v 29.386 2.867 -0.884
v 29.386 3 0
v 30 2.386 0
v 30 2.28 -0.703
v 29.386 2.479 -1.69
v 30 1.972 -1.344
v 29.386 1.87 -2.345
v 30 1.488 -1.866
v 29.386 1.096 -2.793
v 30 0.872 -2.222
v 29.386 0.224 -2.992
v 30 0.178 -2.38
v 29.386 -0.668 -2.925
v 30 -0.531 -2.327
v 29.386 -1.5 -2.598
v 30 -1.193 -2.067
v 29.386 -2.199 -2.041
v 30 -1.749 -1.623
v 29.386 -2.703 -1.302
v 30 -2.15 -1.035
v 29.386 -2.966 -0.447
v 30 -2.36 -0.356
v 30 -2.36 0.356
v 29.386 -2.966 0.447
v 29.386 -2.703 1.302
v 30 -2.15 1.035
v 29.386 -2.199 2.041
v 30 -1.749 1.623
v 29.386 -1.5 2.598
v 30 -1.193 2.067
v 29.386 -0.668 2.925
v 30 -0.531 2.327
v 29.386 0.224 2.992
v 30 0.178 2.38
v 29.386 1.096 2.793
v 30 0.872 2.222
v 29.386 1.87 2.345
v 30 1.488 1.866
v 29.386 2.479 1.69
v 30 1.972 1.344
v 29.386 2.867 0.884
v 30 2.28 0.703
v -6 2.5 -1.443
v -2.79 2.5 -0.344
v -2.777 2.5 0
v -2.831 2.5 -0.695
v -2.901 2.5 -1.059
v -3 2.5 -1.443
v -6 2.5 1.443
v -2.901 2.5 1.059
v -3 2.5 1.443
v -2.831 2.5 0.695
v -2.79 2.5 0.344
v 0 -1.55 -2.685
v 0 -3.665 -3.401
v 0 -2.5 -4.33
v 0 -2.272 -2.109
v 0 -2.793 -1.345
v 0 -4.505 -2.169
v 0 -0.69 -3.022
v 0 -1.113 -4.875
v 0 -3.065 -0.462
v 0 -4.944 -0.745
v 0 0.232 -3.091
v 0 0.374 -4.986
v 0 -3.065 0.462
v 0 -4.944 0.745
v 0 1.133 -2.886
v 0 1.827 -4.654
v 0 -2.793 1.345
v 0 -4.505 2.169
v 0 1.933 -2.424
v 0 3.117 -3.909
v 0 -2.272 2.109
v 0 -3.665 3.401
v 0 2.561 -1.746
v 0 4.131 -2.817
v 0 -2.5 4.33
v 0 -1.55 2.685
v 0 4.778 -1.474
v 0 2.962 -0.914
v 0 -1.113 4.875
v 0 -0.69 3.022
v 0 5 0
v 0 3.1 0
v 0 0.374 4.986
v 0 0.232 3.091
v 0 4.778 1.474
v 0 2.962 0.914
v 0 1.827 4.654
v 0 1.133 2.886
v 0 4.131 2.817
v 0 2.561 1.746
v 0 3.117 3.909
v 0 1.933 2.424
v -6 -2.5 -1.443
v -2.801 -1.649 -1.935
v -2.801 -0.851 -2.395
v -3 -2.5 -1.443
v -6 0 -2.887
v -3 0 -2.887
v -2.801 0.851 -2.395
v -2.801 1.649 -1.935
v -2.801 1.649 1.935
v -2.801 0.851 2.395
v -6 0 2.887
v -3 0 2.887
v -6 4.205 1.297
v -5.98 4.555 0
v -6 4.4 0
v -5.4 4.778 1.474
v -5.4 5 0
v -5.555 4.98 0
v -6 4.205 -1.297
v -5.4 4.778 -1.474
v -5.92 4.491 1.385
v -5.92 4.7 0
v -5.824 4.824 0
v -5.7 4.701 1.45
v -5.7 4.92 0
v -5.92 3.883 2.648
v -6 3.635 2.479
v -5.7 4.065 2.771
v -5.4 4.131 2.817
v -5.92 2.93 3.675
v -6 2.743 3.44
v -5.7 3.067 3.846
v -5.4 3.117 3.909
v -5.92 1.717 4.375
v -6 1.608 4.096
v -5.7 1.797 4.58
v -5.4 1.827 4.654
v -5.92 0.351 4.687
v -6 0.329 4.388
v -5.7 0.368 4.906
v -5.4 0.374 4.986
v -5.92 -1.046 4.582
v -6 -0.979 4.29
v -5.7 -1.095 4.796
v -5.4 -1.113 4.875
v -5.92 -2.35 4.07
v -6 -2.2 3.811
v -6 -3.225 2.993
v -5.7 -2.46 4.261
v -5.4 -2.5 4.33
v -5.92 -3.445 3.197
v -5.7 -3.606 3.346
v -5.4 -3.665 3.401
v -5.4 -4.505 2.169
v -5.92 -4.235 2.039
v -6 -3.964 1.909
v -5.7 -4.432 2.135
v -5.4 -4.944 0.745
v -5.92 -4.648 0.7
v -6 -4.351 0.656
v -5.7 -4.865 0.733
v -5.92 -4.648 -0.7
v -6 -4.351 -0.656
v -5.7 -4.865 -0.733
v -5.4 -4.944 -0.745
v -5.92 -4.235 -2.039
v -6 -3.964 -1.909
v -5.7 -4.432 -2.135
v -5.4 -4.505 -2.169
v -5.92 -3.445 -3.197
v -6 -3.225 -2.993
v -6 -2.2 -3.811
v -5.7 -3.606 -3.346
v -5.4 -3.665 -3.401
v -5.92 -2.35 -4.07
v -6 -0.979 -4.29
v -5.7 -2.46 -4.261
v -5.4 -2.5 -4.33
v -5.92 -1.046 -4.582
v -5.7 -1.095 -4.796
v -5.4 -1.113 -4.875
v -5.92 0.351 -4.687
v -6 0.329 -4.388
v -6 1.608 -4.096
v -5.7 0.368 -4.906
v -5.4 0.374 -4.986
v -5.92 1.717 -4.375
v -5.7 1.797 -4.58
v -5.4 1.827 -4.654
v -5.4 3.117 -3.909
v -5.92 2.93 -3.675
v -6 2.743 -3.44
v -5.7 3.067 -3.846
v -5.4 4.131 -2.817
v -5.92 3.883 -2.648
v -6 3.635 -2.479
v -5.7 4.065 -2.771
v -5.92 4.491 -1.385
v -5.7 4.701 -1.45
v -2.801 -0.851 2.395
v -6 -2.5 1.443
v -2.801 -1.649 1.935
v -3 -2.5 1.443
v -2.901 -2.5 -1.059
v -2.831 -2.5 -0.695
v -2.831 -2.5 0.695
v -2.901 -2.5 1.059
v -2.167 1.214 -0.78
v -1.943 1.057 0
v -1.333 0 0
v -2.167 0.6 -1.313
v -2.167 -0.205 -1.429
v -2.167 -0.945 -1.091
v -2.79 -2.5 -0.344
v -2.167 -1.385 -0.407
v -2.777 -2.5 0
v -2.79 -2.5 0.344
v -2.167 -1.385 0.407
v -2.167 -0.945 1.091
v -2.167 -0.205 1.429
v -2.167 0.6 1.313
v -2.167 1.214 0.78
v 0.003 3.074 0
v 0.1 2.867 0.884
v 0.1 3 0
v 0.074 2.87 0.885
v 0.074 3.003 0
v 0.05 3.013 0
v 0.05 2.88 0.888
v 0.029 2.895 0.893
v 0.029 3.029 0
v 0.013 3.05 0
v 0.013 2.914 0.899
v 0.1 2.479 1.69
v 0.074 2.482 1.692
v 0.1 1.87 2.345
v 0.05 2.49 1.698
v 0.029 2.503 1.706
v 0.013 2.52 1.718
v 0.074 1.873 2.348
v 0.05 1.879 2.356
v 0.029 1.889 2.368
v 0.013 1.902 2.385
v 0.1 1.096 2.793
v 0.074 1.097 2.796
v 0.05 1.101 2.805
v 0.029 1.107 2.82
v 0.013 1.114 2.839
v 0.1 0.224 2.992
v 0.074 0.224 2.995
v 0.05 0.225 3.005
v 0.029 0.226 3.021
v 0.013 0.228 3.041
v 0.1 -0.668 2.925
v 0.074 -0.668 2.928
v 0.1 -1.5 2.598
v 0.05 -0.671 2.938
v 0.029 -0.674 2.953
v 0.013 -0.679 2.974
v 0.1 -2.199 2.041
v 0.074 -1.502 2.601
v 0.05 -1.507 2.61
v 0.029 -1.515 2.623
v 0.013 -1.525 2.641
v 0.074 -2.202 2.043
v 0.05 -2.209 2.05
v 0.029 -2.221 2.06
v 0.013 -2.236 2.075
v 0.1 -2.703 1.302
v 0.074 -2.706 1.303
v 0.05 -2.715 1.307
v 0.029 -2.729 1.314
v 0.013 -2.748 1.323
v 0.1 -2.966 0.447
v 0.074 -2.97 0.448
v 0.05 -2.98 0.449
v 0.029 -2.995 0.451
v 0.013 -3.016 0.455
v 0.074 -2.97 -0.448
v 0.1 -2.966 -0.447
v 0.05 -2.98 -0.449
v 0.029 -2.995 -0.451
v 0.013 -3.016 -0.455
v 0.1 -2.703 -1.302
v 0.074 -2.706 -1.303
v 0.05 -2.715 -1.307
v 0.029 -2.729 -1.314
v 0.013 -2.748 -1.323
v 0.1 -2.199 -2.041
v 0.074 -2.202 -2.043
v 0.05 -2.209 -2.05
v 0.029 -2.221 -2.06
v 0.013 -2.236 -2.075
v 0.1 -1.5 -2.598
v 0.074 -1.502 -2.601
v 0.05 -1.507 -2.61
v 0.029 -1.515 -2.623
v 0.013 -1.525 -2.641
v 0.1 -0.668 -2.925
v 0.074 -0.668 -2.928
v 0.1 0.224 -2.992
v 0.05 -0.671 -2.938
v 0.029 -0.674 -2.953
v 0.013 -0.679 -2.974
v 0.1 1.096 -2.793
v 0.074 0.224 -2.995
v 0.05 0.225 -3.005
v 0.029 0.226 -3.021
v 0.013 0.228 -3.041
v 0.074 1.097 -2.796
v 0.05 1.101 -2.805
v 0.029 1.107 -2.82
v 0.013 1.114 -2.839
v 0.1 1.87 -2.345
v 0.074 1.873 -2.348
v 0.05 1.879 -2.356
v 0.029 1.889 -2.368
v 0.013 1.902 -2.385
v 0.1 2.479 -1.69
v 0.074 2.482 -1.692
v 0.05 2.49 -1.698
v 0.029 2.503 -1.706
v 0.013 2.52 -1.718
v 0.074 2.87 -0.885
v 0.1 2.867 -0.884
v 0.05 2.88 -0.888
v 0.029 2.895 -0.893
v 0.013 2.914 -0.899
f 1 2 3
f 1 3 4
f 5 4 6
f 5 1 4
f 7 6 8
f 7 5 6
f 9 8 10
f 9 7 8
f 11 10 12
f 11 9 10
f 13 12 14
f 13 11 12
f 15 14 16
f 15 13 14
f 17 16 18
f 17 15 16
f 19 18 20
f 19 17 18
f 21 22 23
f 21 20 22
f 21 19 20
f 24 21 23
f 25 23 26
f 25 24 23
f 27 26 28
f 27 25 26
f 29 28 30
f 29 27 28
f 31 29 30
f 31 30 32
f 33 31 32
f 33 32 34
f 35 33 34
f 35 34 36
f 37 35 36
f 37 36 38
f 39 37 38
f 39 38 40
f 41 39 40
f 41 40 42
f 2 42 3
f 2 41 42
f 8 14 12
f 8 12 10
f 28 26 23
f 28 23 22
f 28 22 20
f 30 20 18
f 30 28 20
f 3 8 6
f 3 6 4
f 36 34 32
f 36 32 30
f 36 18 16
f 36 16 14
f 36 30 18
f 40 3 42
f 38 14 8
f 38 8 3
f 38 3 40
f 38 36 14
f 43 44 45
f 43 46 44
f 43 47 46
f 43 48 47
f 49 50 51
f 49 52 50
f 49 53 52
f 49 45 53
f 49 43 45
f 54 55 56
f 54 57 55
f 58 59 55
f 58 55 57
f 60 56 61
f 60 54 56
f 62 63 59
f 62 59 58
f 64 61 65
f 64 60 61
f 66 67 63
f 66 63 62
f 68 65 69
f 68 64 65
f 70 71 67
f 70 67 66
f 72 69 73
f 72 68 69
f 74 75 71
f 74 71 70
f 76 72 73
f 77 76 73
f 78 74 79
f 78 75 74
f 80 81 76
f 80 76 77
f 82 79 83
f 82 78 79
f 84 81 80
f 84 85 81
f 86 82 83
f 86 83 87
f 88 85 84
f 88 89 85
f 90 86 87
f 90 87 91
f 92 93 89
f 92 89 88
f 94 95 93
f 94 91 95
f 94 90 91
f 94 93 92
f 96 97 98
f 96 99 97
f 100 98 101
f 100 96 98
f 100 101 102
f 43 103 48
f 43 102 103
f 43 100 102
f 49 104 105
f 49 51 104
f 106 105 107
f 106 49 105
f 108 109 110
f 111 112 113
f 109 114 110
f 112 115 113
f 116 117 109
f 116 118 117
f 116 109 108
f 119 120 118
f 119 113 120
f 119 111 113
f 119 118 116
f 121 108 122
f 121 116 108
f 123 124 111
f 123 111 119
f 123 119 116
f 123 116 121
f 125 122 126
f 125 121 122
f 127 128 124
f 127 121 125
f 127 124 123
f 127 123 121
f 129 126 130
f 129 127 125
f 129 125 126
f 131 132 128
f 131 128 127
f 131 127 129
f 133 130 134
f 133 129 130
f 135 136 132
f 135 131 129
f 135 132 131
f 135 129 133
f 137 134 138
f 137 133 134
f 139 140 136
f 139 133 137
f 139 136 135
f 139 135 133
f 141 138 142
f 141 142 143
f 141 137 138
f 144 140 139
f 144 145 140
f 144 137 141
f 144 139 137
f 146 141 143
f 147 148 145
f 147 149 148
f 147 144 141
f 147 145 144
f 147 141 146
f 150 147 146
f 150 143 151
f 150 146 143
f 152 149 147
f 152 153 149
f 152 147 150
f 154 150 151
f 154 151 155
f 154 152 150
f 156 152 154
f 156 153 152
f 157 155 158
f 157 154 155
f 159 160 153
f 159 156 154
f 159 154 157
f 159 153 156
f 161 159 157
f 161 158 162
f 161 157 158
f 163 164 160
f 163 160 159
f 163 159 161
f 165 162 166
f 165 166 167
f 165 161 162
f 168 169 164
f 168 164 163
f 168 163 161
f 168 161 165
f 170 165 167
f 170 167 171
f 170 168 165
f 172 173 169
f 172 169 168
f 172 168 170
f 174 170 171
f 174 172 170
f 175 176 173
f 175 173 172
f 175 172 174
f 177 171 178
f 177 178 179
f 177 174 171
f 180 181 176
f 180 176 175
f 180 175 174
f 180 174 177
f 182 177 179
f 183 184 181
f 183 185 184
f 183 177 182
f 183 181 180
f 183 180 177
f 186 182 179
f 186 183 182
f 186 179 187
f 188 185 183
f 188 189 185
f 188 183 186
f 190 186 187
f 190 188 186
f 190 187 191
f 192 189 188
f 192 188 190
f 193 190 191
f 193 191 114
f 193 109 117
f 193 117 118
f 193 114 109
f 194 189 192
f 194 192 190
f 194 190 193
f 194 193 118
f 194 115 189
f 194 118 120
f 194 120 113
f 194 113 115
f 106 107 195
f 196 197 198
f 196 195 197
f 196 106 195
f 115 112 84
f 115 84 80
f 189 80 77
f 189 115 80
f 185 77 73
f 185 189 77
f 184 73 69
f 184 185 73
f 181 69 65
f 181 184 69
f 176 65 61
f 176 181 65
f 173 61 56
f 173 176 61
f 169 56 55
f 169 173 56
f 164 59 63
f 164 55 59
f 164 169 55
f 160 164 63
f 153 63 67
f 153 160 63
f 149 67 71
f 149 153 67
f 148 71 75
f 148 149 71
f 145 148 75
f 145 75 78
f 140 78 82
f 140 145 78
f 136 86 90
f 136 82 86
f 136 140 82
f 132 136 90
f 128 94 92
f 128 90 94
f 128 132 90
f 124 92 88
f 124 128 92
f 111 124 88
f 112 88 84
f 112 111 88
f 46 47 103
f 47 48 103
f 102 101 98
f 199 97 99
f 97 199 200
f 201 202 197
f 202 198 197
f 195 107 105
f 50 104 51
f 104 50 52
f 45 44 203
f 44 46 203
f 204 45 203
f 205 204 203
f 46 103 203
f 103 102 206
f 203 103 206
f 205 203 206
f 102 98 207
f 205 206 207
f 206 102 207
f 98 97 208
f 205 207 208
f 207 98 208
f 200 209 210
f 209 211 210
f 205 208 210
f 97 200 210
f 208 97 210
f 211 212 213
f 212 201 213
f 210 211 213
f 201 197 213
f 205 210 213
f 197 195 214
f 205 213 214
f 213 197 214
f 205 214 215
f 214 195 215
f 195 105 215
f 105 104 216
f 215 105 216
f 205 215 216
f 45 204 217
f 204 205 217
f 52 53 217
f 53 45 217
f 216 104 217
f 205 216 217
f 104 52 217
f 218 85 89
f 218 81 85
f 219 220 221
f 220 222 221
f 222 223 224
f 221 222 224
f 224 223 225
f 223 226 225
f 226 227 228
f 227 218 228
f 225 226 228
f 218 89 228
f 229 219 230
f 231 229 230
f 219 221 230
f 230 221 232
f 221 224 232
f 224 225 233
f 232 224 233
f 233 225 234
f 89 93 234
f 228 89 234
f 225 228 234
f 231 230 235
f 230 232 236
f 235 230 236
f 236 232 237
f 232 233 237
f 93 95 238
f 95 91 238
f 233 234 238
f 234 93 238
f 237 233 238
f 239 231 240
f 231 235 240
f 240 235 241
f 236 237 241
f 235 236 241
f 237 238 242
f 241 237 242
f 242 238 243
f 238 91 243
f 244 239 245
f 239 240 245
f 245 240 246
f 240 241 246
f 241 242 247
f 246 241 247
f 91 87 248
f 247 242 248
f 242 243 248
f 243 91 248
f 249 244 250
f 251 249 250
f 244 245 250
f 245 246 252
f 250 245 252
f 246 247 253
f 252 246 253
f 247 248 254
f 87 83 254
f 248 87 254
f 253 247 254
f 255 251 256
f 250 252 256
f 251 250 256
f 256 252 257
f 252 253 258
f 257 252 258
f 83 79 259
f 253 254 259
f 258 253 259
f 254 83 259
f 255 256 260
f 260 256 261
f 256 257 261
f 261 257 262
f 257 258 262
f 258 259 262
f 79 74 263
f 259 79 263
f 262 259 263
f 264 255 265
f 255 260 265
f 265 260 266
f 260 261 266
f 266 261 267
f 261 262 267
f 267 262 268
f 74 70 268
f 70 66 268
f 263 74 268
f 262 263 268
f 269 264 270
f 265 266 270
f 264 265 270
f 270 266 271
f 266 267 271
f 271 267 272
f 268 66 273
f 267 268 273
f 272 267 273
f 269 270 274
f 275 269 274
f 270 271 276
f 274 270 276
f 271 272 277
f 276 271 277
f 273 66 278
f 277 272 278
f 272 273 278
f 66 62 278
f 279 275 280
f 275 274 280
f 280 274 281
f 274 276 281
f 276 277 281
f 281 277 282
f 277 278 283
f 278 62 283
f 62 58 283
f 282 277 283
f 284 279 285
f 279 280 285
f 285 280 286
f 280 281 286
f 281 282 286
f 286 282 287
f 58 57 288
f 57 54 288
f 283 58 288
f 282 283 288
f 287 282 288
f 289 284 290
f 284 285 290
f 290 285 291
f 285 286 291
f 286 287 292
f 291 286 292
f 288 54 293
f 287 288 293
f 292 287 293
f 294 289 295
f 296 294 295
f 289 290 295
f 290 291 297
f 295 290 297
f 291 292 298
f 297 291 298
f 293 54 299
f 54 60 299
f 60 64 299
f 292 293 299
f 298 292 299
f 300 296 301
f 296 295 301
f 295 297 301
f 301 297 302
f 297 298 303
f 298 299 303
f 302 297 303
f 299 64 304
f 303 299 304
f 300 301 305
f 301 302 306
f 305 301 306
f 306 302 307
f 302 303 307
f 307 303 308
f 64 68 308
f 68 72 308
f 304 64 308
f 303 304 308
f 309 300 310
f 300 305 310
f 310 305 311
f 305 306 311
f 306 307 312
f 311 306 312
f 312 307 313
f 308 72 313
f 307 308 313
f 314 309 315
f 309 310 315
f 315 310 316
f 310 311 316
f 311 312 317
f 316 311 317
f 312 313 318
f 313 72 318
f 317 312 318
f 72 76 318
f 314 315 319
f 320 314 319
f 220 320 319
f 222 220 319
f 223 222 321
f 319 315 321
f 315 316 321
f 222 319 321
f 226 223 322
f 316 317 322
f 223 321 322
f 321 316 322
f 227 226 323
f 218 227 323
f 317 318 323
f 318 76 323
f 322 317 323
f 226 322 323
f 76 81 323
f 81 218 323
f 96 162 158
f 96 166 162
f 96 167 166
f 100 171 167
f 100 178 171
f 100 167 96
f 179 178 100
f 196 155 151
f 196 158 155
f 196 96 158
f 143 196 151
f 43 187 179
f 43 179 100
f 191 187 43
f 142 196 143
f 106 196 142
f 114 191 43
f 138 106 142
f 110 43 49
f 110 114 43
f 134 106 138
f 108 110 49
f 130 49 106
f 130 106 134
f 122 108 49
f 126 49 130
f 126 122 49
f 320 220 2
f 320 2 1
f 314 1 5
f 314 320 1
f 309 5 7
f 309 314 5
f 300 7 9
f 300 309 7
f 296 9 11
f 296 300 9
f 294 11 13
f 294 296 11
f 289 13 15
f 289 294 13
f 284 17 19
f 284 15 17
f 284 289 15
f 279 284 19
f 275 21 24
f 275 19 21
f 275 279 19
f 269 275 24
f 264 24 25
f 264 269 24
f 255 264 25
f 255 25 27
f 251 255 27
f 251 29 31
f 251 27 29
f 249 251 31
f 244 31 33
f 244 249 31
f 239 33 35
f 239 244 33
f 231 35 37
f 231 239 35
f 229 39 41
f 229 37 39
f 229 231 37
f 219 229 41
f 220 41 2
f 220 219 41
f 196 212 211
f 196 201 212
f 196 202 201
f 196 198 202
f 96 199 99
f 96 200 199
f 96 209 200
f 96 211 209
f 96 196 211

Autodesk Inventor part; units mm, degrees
ref_plane "YZ Plane" through (0, 0, 0) normal (1, 0, 0) x (0, 1, 0)
ref_plane "XZ Plane" through (0, 0, 0) normal (0, 1, 0) x (-1, 0, 0)
sketch "Sketch1" plane through (0, 0, 0) normal (0, 0, 1) x (1, 0, 0)
  line L0 (-1.3333, 0) -> (30, 0)
  line L1 (30, 0) -> (30, 3)
  line L2 (30, 3) -> (12, 3)
  line L3 (12, 3) -> (11.3865, 3)
  line L4 (11.3865, 3) -> (0, 3)
  line L5 (0, 3) -> (0, 5)
  line L6 (0, 5) -> (-6, 5)
  line L7 (-6, 5) -> (-6, 2.8868)
  line L8 (-6, 2.8868) -> (-3, 2.8868)
  line L9 (-3, 2.8868) -> (-1.3333, 0)
  line L10 (-13.2, 0) -> (37.2, 0) projected
  line L11 (0, -1) -> (0, 6) projected
  line L12 (12, 3) -> (0, 3) construction
  dimension "d1" = 18
  dimension "d2" = 0.6136
  dimension "d3" = 6
  dimension "d4" = 3
  dimension "d5" = 60
  dimension "d6" = 6
  dimension "d7" = 6
  dimension "d8" = 5.7735
  dimension "d9" = 10
  dimension "d26" = 30
revolve "Body" add sketch "Sketch1" angle 360 about axis through (-1.3333, 0, 0) along (1, 0, 0)
sketch "Sketch2" plane through (-6, 0, 0) normal (-1, 0, 0) x (0, 0, 1)
  circle A0 centre (0, 0) radius 2.8868 projected
  line L0 (0, -7) -> (0, 7) projected
  line L1 (-7, 0) -> (7, 0) projected
  line L2 (2.8868, 0) -> (1.4434, -2.5)
  line L3 (1.4434, -2.5) -> (-1.4434, -2.5)
  line L4 (-1.4434, -2.5) -> (-2.8868, 0)
  line L5 (-2.8868, 0) -> (-1.4434, 2.5)
  line L6 (-1.4434, 2.5) -> (1.4434, 2.5)
  line L7 (1.4434, 2.5) -> (2.8868, 0)
extrude "Slot" add sketch "Sketch2" against normal up to next contours L7 A0 | A0 L2 | L6 L0 A0 | A0 L0 L3 | L0 L6 A0 | A0 L3 L0 | L4 A0 | A0 L5
fillet "Fillet1" radius 0.6 1 edges at (-6, -5, 0)
thread "Thread" size "M6x1" class "6g" standard "ISO Metric profile" length 18
chamfer "Chamfer1" distance 0.6135 distance2 0.6135 1 edges at (30, -3, 0) measured on face at (30, -0.301, -1.1526)
ref_plane "Work Plane1" through (29, 0, 0) normal (0, -1, 0) x (1, 0, 0)
fillet "Fillet2" radius 0.1 1 edges at (0, -3, 0)
equation "\"d1\" = GEL"
equation "\"d3\" = KOH"
equation "\"d4\" = INTI"
equation "\"d6\" = GD"
equation "\"d7\" = BDM"
equation "\"d8\" = 1.1547 * SW"
equation "\"d9\" = KOD"
equation "\"d26\" = NLG"
equation "\"d30\" = R"
equation "\"d17\" = RR"
equation "\"d13\" = GEL"
equation "\"d15\" = -0.5 * SPD + 0.5 * GD"
equation "\"d16\" = GUL"
equation "\"GD\" = NND"
equation "\"NLG\" = 30"
equation "\"GEL\" = 18"
equation "\"KOD\" = 10"
equation "\"KOH\" = NND"
equation "\"INTI\" = 3"
equation "\"GAL\" = 0.61345 * PTC"
equation "\"GUL\" = 0.61345 * PTC"
equation "\"BDM\" = NND"
equation "\"SW\" = 5"
equation "\"RR\" = 0.1 * NND"
equation "\"SPD\" = NND - 1.2269 * PTC"
equation "\"R\" = 0.1"
equation "\"PHH\" = 0.2"
equation "\"GD1\" = THREADDIA - 1.2269 * PTC"
equation "\"THREADDIA\" = 6"
equation "\"FAWI\" = 45deg"
equation "\"PTC\" = 1"
equation "\"KOH1\" = 5.4"
equation "\"NND\" = 6"
equation "\"TOA\" = 30deg"
equation "\"E0\" = 1.155 * SW"
properties part number "AS 1420 - 1973 - M6 x 30" material "Steel, Mild"
